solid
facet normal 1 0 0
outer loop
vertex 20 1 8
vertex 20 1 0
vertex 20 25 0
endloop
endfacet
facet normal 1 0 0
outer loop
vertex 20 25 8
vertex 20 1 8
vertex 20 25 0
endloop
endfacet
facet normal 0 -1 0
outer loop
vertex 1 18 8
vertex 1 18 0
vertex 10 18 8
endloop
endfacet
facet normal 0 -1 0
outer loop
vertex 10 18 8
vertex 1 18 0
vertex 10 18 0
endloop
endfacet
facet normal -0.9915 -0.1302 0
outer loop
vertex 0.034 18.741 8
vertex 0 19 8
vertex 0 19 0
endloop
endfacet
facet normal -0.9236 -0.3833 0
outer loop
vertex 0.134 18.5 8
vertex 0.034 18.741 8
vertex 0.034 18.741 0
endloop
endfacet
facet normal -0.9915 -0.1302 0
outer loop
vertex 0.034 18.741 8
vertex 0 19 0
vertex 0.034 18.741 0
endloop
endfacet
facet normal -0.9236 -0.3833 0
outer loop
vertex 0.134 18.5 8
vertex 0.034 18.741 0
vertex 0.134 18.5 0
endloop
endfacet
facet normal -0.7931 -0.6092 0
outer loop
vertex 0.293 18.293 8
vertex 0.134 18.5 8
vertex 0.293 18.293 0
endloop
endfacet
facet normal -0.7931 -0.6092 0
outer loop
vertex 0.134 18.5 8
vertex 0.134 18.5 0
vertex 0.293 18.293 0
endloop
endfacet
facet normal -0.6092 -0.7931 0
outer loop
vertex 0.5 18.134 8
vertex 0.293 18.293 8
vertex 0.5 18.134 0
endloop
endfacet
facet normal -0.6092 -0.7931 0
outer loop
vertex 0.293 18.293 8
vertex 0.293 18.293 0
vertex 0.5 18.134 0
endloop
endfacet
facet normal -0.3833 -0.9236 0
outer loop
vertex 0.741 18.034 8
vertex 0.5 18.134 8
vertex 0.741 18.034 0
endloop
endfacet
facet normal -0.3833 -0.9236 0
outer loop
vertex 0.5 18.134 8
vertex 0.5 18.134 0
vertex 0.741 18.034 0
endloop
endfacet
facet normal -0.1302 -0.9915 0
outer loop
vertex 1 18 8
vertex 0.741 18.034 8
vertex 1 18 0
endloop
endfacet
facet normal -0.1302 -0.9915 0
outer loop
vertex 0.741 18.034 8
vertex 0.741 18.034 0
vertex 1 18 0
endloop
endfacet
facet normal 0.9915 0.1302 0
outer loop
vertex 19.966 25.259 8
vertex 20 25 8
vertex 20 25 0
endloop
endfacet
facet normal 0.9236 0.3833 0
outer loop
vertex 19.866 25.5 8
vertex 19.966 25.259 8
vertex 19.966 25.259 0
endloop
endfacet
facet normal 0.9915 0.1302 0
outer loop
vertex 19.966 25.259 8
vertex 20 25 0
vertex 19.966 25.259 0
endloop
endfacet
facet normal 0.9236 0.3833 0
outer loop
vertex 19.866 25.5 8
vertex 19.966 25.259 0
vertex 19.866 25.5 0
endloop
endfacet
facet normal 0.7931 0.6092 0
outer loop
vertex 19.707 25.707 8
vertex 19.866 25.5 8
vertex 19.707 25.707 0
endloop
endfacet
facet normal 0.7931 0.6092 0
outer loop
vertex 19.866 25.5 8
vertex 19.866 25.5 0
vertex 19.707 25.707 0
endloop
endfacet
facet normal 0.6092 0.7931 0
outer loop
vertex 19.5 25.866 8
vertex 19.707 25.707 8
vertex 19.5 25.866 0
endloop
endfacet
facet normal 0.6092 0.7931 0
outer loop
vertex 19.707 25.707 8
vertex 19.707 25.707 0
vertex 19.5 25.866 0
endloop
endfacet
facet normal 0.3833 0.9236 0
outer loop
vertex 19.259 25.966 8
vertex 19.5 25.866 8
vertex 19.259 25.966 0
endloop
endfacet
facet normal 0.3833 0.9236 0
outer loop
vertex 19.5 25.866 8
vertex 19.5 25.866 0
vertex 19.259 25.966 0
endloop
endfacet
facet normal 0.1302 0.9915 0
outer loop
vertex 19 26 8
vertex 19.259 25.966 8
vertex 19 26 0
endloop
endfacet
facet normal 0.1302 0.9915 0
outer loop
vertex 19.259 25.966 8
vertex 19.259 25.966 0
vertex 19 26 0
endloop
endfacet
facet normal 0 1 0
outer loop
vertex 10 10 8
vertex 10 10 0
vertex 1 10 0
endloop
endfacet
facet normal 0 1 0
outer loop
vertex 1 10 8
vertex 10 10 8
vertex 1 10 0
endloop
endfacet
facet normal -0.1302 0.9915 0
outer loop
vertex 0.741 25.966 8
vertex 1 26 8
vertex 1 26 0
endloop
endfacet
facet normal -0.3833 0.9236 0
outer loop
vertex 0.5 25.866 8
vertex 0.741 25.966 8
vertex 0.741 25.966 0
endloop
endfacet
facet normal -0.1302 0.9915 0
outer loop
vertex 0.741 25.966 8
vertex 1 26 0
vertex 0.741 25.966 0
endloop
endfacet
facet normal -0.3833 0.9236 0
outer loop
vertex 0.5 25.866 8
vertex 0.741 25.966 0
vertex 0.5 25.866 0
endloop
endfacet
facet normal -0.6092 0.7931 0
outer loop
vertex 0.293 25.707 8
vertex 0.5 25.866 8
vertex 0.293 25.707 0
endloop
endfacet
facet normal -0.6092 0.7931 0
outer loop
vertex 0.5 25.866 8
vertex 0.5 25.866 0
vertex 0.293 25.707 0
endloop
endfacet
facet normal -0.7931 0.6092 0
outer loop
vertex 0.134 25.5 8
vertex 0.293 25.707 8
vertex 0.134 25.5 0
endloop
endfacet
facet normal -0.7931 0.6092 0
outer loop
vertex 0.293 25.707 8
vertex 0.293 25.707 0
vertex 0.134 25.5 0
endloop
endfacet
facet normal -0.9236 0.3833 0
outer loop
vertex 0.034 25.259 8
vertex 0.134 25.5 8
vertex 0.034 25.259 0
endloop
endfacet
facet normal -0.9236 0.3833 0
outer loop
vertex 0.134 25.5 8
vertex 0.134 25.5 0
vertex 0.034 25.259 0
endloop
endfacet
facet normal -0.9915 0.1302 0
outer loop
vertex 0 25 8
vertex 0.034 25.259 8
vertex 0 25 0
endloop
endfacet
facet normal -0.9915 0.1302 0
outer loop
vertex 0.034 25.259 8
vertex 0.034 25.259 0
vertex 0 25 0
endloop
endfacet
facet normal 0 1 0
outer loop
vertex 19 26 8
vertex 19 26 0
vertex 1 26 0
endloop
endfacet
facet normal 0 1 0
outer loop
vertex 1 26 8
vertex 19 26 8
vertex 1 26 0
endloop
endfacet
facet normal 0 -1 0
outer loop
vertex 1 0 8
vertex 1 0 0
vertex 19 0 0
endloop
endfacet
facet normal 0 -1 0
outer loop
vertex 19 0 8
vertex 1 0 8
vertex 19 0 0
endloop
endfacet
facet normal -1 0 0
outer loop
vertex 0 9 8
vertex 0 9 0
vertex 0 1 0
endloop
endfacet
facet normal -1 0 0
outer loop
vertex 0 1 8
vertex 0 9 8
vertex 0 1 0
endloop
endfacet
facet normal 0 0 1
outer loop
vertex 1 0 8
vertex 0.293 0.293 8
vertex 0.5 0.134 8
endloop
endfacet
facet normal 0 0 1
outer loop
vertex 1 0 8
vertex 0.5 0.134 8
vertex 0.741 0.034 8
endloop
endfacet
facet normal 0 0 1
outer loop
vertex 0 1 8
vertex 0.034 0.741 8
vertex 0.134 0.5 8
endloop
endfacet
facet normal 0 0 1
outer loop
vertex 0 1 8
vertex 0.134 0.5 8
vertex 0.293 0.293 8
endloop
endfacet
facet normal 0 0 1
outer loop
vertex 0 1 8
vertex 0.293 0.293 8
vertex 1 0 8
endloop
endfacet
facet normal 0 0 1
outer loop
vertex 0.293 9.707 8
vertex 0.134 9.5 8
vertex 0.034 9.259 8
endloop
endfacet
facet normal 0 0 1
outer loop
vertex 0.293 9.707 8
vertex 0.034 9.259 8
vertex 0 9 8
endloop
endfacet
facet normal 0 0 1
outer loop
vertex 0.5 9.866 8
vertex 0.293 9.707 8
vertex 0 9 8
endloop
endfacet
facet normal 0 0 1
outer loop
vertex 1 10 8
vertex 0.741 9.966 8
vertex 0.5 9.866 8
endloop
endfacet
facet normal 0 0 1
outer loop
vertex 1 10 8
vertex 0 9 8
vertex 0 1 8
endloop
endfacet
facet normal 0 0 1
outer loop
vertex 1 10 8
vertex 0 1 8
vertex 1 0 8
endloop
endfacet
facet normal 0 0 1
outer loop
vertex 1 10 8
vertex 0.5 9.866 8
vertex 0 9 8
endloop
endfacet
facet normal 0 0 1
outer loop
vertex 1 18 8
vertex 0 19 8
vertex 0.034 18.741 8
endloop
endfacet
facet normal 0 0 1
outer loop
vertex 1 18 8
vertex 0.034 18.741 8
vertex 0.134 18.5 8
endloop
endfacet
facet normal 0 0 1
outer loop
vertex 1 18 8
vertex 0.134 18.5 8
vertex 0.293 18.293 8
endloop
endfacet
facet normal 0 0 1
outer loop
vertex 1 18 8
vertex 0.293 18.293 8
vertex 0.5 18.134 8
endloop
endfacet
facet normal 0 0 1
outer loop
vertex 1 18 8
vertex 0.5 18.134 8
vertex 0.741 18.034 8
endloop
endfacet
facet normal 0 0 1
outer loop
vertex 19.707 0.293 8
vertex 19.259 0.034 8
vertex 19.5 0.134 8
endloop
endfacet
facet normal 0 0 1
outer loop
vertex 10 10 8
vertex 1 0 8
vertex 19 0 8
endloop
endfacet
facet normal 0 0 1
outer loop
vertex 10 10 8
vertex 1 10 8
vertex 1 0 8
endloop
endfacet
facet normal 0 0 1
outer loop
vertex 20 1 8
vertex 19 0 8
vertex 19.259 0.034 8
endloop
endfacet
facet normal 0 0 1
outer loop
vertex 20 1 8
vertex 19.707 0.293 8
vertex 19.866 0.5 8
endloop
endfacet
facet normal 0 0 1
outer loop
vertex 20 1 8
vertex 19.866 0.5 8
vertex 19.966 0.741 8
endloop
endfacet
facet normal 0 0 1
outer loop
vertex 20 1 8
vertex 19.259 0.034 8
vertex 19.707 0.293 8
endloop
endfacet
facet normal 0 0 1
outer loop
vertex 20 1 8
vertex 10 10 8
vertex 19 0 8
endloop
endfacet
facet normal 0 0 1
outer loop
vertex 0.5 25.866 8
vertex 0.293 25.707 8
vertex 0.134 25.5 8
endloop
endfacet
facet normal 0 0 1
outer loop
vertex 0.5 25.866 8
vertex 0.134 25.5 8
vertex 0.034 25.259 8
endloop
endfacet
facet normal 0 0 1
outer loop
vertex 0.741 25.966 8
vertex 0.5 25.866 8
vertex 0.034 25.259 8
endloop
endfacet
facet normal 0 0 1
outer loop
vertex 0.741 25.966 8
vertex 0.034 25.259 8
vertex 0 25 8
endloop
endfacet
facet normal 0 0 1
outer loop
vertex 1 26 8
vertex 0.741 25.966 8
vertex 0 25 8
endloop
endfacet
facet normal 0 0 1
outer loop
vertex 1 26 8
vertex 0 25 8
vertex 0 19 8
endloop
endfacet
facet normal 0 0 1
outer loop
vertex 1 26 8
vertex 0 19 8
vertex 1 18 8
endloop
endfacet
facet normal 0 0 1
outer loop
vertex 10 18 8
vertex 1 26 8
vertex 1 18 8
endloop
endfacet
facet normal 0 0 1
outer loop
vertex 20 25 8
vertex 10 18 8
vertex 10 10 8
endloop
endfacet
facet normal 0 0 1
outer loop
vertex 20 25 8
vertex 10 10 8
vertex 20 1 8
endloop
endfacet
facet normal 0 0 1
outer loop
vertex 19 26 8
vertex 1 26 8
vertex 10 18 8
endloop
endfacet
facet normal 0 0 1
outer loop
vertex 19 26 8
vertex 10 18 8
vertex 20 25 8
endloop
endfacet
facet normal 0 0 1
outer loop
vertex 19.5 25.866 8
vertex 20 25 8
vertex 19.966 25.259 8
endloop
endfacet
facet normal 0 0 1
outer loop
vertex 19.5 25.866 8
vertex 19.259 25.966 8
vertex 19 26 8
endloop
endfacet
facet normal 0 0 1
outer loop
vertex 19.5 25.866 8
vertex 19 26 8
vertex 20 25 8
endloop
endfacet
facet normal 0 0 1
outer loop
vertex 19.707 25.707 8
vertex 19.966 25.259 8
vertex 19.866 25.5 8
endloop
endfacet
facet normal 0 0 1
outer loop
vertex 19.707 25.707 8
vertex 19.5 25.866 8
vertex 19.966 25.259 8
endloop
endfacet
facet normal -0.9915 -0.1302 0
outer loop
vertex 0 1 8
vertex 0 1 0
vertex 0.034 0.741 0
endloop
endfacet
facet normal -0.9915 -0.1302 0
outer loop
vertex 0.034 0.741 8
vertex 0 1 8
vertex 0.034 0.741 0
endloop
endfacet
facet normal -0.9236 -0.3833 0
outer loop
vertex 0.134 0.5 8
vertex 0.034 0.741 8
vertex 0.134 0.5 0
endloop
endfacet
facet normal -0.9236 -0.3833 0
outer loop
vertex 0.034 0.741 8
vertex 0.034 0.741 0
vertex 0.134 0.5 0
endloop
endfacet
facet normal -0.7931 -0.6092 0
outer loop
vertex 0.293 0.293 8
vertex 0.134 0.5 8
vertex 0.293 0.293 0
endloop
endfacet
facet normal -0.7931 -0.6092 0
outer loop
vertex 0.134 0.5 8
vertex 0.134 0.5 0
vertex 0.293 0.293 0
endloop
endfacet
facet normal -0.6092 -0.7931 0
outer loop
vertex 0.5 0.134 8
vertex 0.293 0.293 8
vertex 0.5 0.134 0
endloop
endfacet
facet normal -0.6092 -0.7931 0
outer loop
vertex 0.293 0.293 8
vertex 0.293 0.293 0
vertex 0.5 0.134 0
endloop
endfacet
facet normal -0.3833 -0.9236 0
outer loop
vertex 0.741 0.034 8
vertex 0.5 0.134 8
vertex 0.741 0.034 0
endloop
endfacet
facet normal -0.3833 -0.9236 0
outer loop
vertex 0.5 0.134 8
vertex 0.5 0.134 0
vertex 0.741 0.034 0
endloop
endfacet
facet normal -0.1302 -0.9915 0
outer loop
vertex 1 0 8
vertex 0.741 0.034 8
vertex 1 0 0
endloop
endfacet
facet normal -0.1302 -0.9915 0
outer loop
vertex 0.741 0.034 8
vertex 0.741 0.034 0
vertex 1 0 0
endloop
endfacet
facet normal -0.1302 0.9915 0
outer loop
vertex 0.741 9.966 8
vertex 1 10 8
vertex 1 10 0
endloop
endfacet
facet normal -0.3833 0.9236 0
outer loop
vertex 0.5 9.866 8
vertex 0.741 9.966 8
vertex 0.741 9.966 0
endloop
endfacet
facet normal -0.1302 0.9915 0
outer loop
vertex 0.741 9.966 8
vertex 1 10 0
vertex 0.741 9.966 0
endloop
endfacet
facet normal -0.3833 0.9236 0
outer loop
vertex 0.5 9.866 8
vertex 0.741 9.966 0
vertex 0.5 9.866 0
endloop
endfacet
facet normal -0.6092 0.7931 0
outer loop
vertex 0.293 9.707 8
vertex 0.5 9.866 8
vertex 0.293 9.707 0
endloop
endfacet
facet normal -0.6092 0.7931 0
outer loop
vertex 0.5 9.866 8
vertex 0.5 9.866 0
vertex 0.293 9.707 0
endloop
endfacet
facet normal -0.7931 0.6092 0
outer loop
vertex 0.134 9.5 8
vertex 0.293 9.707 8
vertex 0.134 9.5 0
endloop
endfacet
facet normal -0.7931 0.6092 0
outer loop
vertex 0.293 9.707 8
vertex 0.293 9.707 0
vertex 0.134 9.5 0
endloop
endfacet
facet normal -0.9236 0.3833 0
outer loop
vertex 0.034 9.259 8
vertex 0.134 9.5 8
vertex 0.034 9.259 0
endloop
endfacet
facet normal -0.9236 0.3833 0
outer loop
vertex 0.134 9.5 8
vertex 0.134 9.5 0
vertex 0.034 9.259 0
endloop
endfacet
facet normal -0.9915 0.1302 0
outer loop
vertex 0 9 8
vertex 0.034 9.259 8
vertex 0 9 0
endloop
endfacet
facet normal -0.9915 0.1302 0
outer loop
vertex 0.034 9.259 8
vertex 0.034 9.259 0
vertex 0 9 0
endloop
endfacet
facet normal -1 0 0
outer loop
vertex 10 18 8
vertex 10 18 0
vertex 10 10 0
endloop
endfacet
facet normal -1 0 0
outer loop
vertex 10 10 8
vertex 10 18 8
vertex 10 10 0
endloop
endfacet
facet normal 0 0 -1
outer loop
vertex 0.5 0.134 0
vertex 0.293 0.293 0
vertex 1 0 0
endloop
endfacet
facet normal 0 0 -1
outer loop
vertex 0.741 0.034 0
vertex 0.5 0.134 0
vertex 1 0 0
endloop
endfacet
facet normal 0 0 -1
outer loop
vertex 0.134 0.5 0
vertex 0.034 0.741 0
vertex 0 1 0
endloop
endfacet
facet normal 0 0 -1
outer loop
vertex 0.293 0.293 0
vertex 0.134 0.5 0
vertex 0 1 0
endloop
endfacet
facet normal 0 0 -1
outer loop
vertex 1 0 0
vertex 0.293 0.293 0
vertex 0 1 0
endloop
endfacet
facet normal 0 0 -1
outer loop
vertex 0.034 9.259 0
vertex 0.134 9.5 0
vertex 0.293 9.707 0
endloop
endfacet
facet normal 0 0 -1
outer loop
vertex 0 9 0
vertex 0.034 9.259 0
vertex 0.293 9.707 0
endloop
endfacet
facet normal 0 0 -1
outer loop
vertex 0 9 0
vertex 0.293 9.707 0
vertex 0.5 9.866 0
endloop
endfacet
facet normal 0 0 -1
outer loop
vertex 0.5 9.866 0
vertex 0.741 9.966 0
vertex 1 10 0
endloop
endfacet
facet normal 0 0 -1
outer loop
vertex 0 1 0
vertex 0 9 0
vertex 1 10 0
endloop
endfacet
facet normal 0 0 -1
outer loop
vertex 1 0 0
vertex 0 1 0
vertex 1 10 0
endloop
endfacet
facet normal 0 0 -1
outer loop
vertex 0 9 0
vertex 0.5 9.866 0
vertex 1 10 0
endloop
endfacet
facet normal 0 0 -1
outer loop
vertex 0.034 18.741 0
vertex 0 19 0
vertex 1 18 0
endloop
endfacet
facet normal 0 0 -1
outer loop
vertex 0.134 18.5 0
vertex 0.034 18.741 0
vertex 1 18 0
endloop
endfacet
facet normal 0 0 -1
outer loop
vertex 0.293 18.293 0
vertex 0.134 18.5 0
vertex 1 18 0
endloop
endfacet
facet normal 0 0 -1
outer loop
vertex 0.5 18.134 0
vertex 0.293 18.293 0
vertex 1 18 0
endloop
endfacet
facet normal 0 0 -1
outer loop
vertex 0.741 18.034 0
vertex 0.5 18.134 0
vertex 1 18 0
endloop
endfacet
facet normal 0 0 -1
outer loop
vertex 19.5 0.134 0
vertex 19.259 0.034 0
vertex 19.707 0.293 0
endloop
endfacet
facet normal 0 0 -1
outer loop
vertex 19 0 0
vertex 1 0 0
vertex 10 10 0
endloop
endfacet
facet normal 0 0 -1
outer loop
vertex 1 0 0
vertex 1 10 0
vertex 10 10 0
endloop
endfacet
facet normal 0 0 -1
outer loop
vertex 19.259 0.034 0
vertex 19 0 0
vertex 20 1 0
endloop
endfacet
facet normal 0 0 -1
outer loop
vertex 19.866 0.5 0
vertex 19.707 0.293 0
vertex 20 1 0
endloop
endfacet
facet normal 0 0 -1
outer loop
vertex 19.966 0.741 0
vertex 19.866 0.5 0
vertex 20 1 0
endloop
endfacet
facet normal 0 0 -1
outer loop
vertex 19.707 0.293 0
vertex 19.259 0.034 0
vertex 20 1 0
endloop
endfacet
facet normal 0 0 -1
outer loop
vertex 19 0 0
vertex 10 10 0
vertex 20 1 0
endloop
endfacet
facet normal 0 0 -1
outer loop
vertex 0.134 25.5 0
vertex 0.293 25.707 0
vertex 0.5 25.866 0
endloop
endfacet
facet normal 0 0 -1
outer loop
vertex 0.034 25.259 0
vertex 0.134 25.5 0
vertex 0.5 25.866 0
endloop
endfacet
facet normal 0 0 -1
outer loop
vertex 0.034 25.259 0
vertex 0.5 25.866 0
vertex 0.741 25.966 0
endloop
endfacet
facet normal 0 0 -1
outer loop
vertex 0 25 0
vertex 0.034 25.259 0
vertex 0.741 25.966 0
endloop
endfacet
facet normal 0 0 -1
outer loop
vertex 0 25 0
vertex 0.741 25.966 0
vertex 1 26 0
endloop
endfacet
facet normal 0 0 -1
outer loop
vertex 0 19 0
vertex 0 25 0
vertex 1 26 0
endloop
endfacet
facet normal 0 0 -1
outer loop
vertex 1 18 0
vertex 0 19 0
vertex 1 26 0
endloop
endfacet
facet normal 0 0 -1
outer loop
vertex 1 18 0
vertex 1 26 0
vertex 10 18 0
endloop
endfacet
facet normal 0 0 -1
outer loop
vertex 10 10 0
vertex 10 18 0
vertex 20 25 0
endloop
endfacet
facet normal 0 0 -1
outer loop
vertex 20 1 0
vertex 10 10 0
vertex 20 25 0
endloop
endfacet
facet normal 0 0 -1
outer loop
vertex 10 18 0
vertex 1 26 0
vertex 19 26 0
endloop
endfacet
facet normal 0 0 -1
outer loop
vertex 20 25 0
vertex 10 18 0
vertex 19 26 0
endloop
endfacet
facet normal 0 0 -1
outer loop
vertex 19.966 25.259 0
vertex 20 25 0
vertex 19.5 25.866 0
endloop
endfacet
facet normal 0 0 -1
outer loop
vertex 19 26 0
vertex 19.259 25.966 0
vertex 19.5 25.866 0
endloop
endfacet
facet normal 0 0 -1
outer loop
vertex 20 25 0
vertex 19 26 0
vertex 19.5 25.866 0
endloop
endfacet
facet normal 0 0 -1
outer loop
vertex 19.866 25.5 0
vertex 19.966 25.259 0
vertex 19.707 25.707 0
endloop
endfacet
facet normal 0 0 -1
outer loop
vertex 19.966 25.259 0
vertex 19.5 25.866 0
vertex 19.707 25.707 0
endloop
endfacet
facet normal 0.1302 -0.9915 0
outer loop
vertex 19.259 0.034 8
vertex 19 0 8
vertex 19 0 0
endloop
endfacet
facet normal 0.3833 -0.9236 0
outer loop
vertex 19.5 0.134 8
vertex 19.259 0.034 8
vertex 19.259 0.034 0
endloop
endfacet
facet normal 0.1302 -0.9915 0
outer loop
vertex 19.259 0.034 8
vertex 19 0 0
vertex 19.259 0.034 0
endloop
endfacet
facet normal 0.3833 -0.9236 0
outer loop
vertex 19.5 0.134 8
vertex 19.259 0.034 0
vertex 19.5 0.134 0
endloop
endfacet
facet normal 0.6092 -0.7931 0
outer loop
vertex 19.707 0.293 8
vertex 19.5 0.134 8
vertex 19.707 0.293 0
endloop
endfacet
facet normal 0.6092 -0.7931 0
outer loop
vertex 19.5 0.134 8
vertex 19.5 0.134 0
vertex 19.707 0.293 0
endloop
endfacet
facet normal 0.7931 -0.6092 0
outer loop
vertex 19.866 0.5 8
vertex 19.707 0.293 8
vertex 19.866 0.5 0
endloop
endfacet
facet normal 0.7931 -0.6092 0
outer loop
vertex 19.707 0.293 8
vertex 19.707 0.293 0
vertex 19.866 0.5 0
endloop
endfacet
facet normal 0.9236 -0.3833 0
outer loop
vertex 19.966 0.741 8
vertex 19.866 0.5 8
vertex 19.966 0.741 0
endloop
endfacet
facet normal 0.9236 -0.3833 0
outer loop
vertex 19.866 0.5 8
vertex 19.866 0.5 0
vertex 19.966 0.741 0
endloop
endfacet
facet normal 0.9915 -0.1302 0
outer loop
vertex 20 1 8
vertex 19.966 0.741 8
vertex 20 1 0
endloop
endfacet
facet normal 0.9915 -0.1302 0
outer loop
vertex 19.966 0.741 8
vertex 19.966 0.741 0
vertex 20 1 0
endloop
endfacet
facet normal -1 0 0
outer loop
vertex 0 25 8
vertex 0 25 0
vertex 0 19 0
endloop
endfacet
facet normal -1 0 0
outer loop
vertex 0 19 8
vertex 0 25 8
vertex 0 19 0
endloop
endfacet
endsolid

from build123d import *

# Parameters (mm, degrees)
BOSS_EXTRUDE1_DEPTH = 8


with BuildPart() as part:
    # Sketch1 → Boss-Extrude1 (new body)
    with BuildSketch(Plane.XY):
        with BuildLine():
            Line((1, 0), (19, 0))
            ThreePointArc((19, 0), (19.707106781, 0.292893219), (20, 1))
            Line((20, 1), (20, 25))
            ThreePointArc((20, 25), (19.707106781, 25.707106781), (19, 26))
            Line((19, 26), (1, 26))
            ThreePointArc((1, 26), (0.292893219, 25.707106781), (0, 25))
            Line((0, 25), (0, 19))
            ThreePointArc((0, 19), (0.292893219, 18.292893219), (1, 18))
            Line((1, 18), (10, 18))
            Line((10, 18), (10, 10))
            Line((10, 10), (1, 10))
            ThreePointArc((1, 10), (0.292893219, 9.707106781), (0, 9))
            Line((0, 9), (0, 1))
            ThreePointArc((0, 1), (0.292893219, 0.292893219), (1, 0))
        make_face()
    extrude(amount=BOSS_EXTRUDE1_DEPTH)


solid = part.part
